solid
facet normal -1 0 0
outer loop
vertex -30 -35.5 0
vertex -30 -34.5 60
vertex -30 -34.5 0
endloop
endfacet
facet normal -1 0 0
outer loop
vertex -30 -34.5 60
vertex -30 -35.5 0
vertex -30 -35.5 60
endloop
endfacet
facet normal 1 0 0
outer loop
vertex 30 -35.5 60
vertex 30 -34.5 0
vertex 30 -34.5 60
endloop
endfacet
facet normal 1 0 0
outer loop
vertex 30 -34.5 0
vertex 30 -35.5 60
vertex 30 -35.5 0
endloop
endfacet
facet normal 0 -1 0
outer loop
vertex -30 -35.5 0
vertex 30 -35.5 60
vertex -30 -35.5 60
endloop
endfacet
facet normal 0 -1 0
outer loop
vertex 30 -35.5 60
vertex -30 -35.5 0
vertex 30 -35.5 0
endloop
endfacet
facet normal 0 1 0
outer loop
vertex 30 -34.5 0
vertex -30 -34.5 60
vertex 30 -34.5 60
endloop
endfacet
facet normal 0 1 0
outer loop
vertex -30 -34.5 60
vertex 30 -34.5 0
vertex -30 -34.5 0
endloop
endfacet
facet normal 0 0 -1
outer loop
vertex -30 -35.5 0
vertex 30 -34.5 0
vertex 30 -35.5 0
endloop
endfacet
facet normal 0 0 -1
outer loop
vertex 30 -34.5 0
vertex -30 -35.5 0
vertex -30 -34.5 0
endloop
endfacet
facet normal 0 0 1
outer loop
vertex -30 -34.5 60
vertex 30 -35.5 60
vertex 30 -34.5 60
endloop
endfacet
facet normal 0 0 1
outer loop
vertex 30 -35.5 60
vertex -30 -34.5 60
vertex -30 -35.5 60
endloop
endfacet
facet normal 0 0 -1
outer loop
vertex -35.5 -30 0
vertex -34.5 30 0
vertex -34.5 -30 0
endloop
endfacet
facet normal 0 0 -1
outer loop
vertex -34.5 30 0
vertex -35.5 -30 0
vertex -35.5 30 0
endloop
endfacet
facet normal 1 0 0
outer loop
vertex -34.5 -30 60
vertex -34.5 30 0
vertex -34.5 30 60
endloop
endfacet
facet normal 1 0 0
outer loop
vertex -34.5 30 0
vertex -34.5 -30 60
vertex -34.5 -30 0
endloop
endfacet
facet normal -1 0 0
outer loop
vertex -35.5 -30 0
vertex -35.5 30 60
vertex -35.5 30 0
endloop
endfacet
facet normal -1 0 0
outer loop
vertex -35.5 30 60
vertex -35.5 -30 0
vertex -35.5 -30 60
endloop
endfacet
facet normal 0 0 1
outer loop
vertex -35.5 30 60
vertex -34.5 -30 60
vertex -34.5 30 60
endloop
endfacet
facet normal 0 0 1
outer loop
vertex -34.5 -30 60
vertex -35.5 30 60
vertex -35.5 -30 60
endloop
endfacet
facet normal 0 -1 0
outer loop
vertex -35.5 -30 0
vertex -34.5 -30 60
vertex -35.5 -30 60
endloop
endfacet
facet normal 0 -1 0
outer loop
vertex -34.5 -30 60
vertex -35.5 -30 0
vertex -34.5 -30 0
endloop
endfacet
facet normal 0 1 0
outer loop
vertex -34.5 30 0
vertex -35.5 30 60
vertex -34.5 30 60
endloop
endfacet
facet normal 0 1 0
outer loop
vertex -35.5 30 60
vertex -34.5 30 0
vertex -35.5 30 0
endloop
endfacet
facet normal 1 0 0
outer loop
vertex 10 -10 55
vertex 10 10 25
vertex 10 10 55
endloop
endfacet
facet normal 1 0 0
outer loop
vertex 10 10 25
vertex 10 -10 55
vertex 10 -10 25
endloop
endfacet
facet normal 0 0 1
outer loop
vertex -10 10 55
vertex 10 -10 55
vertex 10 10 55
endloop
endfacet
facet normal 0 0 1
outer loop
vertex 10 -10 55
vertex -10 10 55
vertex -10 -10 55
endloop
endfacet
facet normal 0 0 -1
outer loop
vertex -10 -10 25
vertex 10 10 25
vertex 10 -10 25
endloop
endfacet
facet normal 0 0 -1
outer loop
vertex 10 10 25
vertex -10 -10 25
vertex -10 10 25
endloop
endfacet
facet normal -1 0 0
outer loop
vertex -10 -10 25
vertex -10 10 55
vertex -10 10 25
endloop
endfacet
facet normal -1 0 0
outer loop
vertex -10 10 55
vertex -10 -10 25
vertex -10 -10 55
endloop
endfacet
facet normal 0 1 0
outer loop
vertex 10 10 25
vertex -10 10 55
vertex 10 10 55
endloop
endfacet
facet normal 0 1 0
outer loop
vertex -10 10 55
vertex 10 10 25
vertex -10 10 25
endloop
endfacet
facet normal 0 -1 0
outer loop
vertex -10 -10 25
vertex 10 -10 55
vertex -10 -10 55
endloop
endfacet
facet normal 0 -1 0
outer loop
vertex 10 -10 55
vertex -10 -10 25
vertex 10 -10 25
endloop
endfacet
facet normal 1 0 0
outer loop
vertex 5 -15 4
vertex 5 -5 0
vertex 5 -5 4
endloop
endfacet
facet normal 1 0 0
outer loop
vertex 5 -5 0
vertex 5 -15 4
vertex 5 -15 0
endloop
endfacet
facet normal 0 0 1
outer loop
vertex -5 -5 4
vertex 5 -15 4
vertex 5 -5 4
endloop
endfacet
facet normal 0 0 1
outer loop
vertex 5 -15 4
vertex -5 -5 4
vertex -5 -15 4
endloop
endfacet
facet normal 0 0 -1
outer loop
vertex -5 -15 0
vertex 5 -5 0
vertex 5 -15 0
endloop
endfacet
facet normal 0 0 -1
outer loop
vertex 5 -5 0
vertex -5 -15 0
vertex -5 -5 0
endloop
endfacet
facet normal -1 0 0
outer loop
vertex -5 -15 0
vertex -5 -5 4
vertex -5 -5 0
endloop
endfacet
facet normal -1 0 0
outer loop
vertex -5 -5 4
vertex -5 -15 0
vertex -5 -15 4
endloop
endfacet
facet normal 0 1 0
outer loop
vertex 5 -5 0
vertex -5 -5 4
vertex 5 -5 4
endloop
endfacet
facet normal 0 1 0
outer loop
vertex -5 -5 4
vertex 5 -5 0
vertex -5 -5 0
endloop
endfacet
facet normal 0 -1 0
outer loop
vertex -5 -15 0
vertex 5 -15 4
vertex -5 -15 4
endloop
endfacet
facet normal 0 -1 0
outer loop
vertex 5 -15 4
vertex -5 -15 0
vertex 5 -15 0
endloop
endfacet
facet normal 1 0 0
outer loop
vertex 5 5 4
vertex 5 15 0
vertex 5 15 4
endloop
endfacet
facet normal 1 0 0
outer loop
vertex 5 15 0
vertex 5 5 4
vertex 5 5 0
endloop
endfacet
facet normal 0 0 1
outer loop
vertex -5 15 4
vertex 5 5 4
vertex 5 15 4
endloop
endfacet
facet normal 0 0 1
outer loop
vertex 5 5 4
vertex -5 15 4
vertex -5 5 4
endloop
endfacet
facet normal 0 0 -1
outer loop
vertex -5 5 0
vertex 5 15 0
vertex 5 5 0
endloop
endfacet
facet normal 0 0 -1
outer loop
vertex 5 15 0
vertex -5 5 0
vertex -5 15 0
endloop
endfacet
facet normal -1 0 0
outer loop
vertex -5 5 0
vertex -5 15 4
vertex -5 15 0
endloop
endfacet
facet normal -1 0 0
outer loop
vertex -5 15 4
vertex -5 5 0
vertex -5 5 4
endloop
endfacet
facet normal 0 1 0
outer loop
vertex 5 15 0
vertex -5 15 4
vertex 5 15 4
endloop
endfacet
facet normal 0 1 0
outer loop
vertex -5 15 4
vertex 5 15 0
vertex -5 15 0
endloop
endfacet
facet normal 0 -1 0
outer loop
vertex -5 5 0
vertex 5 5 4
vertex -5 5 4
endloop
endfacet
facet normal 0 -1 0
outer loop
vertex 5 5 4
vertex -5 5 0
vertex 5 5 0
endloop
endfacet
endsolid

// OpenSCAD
// #####################################
// lamp_minion
// #####################################

// helpers #############################

module polyk(pts) { linear_extrude(height=1,center=true) polygon(pts); }

module side_helper() { translate([0,-35,30]) rotate([90,0,0]) cube([60,60,1],center=true); }
module back_helper() { translate([-35,0,30]) rotate([0,90,0]) cube([60,60,1],center=true); }
module helpers() { side_helper(); back_helper(); }

// cut preview #########################

module cut_preview() {
  //
  // body
  translate([0,0,40])
  cube([20,20,30],center=true);
  //
  // thigh right
  // thigh left
  // leg right
  // leg left
  // foot right
  translate([0,-10,2]) cube([10,10,4],center=true);
  // foot left
  translate([0,10,2]) cube([10,10,4],center=true);
  //
  //
}

// modules #############################

module body() {
  //
  //
}

// legs modules ##############

module hip() {
  //
  // IDEA : raquette
  //
}

module foot() {
  //
  //cube([
  //
}

module leg() {
  //
  foot();
  //
}

// assembly ############################

module assembly_lamp_minion() {
  union() {
    //
    //
  }
}

//launch time ! ########################

helpers();
cut_preview();
//assembly_lamp_minion();
